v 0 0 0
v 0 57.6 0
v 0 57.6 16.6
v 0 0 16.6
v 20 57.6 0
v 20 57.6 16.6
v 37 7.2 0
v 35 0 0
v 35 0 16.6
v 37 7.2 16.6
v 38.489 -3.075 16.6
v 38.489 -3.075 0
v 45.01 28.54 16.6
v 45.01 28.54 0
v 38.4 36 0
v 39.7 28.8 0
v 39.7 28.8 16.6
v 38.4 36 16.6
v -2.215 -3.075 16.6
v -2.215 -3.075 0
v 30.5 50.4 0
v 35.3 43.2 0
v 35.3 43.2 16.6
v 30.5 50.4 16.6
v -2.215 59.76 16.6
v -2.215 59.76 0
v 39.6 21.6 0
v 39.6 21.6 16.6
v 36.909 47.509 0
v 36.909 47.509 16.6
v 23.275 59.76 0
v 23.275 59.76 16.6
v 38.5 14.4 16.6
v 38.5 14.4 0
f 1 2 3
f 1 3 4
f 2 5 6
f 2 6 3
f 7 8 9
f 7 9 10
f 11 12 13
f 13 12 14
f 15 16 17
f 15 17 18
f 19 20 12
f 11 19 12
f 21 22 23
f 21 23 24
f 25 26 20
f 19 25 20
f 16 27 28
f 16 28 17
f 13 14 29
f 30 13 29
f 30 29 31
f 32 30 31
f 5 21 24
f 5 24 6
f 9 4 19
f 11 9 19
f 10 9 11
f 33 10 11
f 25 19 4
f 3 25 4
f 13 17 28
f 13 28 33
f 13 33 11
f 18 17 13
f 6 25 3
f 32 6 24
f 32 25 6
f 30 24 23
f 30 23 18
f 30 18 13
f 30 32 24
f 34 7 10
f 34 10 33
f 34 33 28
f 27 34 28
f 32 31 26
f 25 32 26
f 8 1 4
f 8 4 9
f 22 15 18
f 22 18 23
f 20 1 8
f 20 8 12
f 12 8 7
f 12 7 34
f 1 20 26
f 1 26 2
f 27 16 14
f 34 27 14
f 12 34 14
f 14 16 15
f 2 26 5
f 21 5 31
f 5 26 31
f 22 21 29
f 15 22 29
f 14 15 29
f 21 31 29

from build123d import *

# Parameters (mm, degrees)
PAD_DEPTH = 16.6


with BuildPart() as part:
    # Sketch → Pad (new body)
    with BuildSketch(Plane.XY):
        Polygon((-2.215162, 59.759811), (-2.215162, -3.075415), (38.48941, -3.075415), (45.010048, 28.539799), (36.908657, 47.508923), (23.274607, 59.759811), align=None)
        Polygon((0, 0), (35, 0), (37, 7.2), (38.5, 14.4), (39.6, 21.6), (39.7, 28.8), (38.4, 36), (35.3, 43.2), (30.5, 50.4), (20, 57.6), (0, 57.6), align=None, mode=Mode.SUBTRACT)
    extrude(amount=PAD_DEPTH)


solid = part.part
